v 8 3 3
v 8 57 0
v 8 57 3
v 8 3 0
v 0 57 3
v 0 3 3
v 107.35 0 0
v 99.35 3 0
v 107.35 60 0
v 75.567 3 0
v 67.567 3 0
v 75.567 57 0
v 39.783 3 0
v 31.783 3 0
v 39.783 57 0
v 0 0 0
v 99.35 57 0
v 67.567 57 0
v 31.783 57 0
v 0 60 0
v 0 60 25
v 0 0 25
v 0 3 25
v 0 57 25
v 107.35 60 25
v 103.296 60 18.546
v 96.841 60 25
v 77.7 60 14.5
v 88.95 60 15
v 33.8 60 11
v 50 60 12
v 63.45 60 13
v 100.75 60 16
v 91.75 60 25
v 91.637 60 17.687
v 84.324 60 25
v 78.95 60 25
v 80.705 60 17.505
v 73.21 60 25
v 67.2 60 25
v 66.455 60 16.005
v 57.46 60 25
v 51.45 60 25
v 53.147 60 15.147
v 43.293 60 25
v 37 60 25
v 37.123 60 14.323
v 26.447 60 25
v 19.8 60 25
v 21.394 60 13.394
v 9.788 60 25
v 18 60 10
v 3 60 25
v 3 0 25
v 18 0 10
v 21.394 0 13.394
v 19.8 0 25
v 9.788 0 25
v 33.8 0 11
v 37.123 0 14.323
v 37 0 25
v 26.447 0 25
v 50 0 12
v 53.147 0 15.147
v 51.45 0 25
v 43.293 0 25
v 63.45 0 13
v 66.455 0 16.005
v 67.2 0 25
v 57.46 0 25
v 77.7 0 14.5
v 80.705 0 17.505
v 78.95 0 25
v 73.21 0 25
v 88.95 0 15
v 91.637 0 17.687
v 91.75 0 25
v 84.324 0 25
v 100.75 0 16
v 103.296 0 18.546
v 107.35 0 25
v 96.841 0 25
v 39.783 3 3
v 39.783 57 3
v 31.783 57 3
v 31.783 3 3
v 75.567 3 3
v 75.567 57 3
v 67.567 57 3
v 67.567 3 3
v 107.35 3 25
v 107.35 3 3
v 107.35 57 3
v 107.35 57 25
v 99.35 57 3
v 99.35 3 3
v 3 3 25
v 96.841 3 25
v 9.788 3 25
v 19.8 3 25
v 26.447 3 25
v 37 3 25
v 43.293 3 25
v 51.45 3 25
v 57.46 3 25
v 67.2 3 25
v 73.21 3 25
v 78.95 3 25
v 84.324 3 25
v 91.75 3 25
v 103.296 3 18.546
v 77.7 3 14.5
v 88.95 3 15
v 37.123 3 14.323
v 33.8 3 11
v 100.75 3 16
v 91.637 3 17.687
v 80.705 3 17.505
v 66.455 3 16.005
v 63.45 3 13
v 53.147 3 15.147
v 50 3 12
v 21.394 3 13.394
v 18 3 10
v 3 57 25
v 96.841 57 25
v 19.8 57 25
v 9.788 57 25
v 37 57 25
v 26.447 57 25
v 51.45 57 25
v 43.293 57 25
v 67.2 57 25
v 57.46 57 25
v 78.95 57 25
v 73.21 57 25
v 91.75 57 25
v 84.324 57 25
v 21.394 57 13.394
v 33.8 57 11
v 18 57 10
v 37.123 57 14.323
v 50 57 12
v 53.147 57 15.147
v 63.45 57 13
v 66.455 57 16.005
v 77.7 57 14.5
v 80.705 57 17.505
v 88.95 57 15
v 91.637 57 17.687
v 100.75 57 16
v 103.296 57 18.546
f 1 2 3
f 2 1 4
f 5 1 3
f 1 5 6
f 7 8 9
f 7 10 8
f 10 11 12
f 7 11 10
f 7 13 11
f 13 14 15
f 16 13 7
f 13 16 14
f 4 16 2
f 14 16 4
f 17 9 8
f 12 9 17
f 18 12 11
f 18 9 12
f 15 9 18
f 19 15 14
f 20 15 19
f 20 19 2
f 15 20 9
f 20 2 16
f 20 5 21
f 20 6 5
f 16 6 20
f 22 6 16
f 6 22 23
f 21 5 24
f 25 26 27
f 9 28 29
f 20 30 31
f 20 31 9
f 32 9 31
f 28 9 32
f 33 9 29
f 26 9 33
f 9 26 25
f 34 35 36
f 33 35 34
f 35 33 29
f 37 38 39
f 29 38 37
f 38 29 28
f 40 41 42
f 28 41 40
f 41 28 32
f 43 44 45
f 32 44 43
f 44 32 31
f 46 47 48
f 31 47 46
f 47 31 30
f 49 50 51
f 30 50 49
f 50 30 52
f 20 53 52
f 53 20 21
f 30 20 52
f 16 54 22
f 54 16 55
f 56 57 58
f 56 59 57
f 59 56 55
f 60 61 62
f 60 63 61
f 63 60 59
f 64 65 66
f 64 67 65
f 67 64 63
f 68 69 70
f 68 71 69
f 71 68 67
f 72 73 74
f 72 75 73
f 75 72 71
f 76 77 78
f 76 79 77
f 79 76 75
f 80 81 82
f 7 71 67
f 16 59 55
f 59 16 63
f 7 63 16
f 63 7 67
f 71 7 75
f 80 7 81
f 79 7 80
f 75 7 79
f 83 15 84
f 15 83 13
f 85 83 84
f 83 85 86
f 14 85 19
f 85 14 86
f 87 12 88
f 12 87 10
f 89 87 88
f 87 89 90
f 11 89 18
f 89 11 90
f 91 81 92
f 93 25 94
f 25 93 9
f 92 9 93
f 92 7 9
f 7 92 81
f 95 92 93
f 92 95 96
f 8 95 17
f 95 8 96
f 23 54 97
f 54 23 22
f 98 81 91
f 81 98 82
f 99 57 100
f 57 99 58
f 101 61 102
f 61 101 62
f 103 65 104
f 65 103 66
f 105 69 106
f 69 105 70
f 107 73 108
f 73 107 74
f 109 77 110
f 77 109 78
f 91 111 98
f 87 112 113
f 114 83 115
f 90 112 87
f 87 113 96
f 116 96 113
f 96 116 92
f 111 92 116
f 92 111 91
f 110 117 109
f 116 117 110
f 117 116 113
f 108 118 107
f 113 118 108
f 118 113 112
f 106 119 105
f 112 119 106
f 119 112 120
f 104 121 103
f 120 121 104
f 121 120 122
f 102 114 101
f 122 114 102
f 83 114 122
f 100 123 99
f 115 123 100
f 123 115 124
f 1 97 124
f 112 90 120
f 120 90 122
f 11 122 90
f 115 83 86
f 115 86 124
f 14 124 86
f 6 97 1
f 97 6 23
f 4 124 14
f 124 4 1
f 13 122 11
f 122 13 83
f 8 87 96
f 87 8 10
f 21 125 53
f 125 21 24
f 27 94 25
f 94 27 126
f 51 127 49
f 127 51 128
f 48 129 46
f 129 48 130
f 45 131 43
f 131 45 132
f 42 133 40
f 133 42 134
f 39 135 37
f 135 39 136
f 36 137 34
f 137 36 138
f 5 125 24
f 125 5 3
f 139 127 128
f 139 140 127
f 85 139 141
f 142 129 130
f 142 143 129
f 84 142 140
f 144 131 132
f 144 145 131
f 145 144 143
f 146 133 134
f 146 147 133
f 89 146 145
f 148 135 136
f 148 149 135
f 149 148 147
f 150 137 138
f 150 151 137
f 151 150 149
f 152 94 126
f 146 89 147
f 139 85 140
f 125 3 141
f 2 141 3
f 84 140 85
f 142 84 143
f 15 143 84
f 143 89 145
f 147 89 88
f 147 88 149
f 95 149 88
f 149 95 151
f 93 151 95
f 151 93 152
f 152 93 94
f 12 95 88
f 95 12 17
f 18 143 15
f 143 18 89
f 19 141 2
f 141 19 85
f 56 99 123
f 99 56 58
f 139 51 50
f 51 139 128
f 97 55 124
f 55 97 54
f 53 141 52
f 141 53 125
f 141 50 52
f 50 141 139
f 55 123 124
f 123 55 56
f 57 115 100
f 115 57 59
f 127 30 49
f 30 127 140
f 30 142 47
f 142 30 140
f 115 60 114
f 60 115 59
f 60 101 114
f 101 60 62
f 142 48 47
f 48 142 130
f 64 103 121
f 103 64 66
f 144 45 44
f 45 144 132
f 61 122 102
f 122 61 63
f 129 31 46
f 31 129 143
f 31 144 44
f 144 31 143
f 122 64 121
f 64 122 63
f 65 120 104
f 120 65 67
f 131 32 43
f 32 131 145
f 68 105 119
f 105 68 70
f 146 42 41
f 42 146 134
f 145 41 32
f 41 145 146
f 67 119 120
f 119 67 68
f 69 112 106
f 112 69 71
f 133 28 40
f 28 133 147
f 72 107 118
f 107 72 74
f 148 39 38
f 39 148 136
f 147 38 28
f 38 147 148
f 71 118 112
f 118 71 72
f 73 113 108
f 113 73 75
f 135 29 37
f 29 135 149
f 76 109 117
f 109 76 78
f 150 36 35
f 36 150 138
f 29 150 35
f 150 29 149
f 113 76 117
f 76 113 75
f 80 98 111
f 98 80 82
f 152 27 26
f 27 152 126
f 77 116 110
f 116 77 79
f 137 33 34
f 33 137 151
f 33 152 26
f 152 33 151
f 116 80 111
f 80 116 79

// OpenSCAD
//                   17     15     14     13     12     10      9
widths        = [  4.80,  4.70,  4.45,  4.25,  4.25,  3.80,  3.60];
spacing       = [ 11,    11.5,   9,    10,     7,     8,     8];
pocket_depth  = [ 15,    14,    13,    12,    10.5,  10,     9];

base_width   = 60.0;
rail_width   =  3.0;
rail_height  = 25.0;
cross_height = 3.00;
cross_bars   =  4;

function sum (v, i = 0, r = 0) = i < len (v) ? sum (v, i + 1, r + v [i]) : r;
function subarray (list, begin = 0, end = -1) = [
  let (end = end < 0 ? len (list) : end)
    for (i = [begin : 1 : end - 1])
      list [i]
];

length = sum (widths) + sum (spacing) + 13;

difference () {
  union () {
    for (i = [0 : cross_bars - 1])
      translate ([i == 0 ? 0 : ((length / (cross_bars - 1)) * i) - (i == (cross_bars - 1) ? 8 : 4), 0, 0])
        cube ([8, base_width, cross_height]);
    translate ([0, 0, 0])
      cube ([length, rail_width, rail_height]);
    translate ([0, base_width - rail_width, 0])
      cube ([length, rail_width, rail_height]);
  }

  for (i = [0 : len (widths) - 1]) {
    translate ([18 + sum (subarray (spacing, 0, i)) + sum (subarray (widths, 0, i)), -0.01, rail_height - pocket_depth [i]])
      rotate ([0, 315, 0])
        cube ([widths [i], base_width + 0.02, 25]);
  }
}
